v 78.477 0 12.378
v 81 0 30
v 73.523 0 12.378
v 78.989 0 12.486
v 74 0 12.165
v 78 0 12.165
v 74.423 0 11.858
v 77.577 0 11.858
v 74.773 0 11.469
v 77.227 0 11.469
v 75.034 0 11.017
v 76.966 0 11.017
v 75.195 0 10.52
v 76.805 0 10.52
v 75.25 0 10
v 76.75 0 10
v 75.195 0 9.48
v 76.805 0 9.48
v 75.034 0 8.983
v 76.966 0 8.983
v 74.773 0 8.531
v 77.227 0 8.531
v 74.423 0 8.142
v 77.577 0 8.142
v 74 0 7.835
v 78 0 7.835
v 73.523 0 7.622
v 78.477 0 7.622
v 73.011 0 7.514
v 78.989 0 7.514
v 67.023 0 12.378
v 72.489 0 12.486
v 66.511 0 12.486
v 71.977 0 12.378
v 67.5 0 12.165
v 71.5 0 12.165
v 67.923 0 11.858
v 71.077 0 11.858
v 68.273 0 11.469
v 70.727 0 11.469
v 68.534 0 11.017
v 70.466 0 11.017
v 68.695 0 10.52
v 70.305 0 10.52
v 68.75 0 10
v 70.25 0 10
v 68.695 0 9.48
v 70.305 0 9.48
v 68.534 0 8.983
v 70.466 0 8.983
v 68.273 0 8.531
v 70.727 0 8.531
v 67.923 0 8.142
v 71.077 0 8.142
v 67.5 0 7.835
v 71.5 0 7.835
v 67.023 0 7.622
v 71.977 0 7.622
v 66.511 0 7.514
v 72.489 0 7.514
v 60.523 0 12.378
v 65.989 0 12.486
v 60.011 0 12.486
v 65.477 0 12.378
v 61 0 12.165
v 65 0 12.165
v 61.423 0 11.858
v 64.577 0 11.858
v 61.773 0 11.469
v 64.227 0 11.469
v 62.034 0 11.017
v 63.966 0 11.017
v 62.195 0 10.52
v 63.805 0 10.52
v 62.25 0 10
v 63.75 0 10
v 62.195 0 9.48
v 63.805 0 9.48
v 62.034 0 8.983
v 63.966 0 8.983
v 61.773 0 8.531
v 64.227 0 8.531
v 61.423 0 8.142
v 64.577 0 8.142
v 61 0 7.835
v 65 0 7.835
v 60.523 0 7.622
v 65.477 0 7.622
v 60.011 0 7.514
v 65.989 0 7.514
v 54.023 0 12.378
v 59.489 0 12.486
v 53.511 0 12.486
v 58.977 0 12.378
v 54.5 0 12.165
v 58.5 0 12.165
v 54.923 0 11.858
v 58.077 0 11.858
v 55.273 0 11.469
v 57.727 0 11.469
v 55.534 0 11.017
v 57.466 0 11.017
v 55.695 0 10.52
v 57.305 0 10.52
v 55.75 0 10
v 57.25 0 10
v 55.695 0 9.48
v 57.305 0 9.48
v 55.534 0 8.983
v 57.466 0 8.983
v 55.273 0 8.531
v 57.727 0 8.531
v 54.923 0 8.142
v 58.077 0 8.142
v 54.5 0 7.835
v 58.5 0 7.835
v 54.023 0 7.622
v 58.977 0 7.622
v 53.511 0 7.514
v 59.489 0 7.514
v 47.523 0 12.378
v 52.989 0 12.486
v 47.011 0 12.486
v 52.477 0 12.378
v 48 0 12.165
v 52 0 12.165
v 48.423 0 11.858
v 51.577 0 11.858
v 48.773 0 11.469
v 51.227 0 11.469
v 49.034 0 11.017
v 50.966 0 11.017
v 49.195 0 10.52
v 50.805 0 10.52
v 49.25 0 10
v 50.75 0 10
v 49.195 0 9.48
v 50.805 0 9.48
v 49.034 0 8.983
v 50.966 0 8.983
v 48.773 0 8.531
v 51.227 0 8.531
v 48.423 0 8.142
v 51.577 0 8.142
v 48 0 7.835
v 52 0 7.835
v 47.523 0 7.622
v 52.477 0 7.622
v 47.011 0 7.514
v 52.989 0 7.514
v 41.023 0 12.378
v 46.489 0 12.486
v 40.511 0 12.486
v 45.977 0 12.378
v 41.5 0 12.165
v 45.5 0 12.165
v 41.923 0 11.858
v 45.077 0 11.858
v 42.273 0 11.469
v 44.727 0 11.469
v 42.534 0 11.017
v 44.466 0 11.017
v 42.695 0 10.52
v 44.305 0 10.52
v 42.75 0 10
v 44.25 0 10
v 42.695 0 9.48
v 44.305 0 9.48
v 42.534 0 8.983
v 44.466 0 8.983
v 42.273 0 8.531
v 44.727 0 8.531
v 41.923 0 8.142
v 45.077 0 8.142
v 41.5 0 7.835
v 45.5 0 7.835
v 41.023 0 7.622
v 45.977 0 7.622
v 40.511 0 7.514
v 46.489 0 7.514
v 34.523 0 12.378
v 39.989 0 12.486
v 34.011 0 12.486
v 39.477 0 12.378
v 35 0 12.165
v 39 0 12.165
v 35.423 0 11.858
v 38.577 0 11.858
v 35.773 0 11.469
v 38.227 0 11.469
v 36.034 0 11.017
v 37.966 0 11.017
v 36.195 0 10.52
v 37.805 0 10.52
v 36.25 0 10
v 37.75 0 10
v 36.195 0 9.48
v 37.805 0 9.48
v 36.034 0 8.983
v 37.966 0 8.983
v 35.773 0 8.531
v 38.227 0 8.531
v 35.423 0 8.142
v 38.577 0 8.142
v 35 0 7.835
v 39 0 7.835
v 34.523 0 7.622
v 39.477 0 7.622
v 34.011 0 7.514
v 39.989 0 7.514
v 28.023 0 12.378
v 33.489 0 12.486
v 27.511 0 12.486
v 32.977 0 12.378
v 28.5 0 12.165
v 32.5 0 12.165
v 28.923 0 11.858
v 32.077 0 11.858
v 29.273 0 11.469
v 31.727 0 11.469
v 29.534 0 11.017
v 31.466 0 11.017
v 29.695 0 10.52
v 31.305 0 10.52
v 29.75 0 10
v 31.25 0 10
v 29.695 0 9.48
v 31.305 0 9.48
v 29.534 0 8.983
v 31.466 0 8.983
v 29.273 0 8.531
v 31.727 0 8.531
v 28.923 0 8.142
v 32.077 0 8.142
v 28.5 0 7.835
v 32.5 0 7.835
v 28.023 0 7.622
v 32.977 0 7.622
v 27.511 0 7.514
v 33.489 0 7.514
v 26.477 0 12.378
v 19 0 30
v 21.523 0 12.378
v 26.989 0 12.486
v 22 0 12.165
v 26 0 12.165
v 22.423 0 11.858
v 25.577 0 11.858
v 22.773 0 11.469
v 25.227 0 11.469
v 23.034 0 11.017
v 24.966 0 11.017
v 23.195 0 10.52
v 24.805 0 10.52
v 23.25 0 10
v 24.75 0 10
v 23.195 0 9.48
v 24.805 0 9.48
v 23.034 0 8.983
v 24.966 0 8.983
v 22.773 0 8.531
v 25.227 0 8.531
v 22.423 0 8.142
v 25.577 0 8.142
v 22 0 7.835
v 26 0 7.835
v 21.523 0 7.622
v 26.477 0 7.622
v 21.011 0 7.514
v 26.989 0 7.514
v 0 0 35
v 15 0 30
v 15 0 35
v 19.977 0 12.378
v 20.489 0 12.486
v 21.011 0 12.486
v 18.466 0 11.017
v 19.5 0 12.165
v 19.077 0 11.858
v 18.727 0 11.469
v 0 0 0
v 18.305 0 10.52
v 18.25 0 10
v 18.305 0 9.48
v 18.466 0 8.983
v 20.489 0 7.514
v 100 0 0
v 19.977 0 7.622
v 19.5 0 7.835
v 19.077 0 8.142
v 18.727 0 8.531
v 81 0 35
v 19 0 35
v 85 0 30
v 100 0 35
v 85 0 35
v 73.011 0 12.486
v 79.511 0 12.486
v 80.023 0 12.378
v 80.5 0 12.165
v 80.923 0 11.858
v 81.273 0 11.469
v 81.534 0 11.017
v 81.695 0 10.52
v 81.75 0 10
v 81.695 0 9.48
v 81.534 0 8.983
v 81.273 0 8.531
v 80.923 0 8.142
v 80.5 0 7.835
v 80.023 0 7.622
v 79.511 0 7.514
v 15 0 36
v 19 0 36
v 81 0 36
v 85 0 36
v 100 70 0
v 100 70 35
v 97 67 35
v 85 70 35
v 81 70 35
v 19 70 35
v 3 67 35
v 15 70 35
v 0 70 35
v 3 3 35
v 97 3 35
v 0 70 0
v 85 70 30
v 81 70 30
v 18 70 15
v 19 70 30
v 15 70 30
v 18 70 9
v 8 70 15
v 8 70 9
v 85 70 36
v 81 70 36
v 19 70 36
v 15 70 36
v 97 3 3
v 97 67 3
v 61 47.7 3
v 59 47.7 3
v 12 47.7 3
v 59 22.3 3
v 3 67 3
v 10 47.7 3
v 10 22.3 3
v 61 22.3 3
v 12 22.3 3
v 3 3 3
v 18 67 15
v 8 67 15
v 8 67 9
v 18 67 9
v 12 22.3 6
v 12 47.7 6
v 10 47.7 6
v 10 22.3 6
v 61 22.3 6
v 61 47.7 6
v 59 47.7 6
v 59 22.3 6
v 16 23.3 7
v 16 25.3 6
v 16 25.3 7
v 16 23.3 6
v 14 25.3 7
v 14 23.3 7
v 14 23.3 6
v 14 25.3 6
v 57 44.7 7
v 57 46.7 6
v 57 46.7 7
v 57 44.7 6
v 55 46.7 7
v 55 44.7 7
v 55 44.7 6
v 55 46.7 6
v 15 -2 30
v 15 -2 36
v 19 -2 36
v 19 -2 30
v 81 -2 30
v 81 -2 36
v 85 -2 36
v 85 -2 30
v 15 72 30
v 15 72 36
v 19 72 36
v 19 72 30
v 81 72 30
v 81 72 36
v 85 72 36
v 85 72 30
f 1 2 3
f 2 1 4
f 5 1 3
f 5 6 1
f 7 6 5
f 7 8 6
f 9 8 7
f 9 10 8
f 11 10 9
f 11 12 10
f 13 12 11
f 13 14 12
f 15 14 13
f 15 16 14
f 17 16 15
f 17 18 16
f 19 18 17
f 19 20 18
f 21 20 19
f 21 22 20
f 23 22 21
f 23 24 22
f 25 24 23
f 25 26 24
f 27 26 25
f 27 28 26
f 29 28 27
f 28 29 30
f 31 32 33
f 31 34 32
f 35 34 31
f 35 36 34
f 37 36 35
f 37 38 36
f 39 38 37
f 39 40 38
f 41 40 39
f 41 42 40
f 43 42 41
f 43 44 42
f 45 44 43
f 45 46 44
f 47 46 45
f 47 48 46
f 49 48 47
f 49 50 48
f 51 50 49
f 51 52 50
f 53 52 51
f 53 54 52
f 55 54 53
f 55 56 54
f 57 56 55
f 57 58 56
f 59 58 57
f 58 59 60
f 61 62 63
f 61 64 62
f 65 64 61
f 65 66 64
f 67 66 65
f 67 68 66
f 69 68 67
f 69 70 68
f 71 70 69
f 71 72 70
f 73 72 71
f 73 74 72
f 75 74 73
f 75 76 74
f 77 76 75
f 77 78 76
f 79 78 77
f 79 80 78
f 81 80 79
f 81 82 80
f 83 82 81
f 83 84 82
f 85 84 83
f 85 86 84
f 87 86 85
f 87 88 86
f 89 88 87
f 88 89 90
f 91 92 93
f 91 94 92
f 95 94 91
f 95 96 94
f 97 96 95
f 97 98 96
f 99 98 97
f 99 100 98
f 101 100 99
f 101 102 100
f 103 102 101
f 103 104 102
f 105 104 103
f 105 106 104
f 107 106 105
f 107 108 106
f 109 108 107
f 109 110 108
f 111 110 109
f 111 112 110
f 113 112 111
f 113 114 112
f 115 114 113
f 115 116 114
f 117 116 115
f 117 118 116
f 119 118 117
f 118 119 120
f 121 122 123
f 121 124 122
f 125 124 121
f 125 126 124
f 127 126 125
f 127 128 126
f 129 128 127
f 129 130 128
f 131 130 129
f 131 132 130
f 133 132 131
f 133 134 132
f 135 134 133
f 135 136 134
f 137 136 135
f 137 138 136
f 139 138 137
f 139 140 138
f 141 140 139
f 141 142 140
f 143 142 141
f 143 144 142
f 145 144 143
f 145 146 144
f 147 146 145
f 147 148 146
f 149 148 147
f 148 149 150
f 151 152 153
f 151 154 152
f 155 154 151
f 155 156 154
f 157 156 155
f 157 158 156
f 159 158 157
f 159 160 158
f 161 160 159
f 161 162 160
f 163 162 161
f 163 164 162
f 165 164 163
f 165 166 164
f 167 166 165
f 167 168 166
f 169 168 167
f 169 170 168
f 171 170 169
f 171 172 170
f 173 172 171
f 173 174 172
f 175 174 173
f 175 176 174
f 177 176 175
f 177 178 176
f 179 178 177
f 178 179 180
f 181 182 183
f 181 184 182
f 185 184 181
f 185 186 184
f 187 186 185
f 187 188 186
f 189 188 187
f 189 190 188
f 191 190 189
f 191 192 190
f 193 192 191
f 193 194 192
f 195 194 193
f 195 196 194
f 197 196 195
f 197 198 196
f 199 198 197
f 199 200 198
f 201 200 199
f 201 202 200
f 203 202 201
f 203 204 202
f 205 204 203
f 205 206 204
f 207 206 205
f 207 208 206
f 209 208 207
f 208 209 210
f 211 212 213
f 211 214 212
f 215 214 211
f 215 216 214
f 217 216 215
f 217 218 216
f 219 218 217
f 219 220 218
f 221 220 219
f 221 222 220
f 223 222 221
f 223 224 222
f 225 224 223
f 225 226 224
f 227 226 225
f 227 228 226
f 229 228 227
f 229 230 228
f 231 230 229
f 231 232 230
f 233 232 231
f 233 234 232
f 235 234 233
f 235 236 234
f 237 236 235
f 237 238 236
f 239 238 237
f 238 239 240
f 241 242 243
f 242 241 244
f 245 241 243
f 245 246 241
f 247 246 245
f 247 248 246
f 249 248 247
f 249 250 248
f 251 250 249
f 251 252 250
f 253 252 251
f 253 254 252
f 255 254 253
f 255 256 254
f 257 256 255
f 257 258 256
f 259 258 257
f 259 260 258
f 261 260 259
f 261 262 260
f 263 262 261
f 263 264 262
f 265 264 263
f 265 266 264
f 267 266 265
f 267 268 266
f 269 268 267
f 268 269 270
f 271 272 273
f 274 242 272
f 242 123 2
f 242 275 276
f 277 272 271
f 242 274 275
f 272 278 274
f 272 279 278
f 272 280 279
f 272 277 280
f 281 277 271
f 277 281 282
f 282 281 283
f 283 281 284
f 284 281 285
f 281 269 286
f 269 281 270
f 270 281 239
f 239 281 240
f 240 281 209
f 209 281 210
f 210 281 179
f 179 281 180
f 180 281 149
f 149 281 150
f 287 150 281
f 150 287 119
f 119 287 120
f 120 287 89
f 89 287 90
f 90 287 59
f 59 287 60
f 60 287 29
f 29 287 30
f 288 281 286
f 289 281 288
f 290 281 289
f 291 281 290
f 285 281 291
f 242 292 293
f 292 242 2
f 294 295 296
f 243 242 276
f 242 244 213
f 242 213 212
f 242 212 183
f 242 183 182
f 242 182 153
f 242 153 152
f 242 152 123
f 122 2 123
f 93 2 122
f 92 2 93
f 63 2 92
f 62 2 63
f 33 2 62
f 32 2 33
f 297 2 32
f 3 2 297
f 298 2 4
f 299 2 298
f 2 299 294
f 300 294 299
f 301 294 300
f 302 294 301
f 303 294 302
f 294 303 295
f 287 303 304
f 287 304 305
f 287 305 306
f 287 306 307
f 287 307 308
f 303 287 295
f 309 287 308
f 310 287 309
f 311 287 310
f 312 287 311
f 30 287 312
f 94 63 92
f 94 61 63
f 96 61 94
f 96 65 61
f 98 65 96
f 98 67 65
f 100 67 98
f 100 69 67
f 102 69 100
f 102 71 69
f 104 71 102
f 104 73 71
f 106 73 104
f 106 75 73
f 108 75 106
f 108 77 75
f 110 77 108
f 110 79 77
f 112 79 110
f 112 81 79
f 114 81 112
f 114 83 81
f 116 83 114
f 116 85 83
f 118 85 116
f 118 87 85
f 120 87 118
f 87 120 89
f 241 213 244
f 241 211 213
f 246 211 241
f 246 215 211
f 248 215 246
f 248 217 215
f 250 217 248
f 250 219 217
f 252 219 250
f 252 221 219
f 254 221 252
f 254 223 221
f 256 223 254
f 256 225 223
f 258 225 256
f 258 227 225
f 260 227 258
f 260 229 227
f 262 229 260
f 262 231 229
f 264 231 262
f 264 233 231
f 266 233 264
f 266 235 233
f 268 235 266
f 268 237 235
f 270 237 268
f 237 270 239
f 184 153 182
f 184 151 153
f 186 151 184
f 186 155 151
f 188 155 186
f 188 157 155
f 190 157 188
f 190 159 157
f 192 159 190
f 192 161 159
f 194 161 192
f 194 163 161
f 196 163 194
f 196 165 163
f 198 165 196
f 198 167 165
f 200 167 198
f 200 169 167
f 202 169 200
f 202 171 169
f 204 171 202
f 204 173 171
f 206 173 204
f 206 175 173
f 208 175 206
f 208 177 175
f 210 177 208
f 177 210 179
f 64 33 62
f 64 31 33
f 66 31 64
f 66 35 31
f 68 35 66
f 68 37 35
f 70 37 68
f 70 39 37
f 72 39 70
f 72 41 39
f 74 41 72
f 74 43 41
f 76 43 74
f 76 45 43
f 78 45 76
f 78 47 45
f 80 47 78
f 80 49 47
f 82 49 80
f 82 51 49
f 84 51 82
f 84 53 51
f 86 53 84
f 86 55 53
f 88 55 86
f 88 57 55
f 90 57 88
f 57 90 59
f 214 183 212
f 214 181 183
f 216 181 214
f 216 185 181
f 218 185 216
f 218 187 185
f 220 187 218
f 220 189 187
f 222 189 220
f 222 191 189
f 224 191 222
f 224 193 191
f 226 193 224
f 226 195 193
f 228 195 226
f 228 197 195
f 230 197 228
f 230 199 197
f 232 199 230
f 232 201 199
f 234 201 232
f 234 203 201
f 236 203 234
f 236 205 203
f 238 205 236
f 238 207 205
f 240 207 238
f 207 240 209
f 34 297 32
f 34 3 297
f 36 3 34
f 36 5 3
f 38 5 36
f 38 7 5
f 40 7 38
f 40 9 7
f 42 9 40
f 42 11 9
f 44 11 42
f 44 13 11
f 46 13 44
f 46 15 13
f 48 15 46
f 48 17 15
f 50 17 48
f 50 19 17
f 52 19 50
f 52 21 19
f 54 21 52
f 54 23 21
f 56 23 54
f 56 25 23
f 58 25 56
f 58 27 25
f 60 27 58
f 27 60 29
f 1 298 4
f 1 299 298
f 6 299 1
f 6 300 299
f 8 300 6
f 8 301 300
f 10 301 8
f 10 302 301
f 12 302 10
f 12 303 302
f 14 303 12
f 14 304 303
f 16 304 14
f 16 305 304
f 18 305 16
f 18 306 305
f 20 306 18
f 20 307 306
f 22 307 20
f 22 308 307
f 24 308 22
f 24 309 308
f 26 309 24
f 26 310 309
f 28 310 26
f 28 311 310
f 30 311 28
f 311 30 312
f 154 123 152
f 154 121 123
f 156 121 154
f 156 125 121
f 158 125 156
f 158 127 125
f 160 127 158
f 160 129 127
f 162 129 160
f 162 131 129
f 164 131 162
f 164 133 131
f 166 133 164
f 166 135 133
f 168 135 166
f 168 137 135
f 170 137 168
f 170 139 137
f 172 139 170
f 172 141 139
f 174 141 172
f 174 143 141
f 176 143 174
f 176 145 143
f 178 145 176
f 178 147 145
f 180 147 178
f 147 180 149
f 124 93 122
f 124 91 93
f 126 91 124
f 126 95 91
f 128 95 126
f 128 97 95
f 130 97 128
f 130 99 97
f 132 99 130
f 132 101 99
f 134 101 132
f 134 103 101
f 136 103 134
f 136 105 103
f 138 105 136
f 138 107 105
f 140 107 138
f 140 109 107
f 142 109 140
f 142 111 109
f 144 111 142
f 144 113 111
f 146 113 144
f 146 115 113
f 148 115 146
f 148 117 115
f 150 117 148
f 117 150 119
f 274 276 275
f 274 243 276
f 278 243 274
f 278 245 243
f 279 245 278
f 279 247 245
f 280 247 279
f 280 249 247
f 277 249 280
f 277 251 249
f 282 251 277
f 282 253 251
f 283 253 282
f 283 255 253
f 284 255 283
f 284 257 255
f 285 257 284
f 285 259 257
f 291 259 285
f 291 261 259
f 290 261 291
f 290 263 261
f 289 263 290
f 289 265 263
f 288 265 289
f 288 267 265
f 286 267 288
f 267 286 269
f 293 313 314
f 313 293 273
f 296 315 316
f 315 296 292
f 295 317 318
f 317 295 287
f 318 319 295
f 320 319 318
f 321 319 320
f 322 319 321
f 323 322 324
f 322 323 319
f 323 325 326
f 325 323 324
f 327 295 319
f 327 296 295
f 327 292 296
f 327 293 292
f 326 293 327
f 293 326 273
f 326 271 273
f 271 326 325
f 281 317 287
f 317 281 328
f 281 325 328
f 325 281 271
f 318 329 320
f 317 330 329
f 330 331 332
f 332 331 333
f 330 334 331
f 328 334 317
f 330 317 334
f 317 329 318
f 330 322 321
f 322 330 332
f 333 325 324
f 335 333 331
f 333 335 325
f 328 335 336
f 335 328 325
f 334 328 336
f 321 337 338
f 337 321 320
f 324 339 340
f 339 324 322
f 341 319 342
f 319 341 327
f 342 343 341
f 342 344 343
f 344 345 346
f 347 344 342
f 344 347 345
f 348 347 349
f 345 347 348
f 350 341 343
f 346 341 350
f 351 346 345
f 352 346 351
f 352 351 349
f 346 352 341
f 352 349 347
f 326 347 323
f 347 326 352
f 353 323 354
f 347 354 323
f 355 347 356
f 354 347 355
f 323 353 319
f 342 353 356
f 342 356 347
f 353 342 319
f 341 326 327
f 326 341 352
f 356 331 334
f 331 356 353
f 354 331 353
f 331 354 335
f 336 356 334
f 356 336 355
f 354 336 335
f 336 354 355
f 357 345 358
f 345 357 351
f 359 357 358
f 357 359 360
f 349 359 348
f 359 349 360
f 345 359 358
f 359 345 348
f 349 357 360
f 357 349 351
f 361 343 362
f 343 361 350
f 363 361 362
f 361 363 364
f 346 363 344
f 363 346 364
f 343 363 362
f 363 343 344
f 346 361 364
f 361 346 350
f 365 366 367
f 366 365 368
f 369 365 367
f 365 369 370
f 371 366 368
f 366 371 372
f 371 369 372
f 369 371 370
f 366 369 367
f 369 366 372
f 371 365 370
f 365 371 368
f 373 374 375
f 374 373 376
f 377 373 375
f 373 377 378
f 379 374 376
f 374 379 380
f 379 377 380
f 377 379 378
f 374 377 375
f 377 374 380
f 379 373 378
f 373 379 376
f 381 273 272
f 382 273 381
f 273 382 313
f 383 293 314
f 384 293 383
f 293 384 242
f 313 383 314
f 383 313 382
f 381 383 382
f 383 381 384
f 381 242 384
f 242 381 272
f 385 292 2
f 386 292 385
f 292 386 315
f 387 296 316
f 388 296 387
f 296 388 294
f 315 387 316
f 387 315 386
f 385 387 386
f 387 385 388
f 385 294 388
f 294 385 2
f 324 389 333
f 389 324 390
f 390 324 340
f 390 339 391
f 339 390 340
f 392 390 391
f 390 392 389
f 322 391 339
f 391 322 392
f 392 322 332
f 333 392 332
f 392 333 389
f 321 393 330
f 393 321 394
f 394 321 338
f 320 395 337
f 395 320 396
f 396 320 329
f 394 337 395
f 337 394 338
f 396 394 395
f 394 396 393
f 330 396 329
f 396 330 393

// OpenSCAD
// ESP32 Einrast-Gehäuseboden mit Führung, Clips, Haken und Kabeldurchführungen

case_l = 100;
case_w = 70;
case_h = 35;
wall = 3;

esp32_l = 51;
esp32_w = 25.4;  // exakt 1 Inch
esp32_z = 3;
esp32_offset = 10;

cable_count = 10;
cable_d = 5;
cable_spacing = 6.5;

hook_w = 4;
hook_d = 2;
hook_h = 5;

// Seitliche Schienen und Drucknasen für ESP32
module esp32_mount(x, y) {
    // seitliche Führungen
    translate([x, y, wall])
        cube([2, esp32_w, 3]); // links
    translate([x + esp32_l - 2, y, wall])
        cube([2, esp32_w, 3]); // rechts

    // Drucknasen
    translate([x + 4, y + 1, wall + 3])
        cube([2, 2, 1]);
    translate([x + esp32_l - 6, y + esp32_w - 3, wall + 3])
        cube([2, 2, 1]);
}

// Einrast-Haken (sichtbar)
module hook(x, y, z) {
    translate([x, y, z])
        hull() {
            cube([hook_w, hook_d, 1]);
            translate([0, 0, hook_h])
                cube([hook_w, hook_d, 1]);
        }
}

difference() {
    // Gehäuse außen
    cube([case_l, case_w, case_h]);

    // Innenhohlraum
    translate([wall, wall, wall])
        cube([case_l - 2*wall, case_w - 2*wall, case_h]);

    // USB-Aussparung
    translate([esp32_offset - 2, case_w - wall, wall + 6])
        cube([10, wall + 1, 6]);

    // Kabeldurchführungen
    for (i = [0:cable_count - 1]) {
        x = (case_l - (cable_count - 1) * cable_spacing)/2 + i * cable_spacing;
        translate([x, 0, 10])
            rotate([90,0,0])
            cylinder(h=wall + 1, d=cable_d, $fn=30);

        // Zugentlastung
        translate([x - 2, wall + 2, 8])
            cube([4, 2, 4]);
    }
}

// ESP32-Führung einbauen
esp32_mount(esp32_offset, (case_w - esp32_w)/2);

// Haken einbauen
hook(15, -hook_d, case_h - hook_h); // vorne links
hook(case_l - 19, -hook_d, case_h - hook_h); // vorne rechts
hook(15, case_w, case_h - hook_h); // hinten links
hook(case_l - 19, case_w, case_h - hook_h); // hinten rechts
